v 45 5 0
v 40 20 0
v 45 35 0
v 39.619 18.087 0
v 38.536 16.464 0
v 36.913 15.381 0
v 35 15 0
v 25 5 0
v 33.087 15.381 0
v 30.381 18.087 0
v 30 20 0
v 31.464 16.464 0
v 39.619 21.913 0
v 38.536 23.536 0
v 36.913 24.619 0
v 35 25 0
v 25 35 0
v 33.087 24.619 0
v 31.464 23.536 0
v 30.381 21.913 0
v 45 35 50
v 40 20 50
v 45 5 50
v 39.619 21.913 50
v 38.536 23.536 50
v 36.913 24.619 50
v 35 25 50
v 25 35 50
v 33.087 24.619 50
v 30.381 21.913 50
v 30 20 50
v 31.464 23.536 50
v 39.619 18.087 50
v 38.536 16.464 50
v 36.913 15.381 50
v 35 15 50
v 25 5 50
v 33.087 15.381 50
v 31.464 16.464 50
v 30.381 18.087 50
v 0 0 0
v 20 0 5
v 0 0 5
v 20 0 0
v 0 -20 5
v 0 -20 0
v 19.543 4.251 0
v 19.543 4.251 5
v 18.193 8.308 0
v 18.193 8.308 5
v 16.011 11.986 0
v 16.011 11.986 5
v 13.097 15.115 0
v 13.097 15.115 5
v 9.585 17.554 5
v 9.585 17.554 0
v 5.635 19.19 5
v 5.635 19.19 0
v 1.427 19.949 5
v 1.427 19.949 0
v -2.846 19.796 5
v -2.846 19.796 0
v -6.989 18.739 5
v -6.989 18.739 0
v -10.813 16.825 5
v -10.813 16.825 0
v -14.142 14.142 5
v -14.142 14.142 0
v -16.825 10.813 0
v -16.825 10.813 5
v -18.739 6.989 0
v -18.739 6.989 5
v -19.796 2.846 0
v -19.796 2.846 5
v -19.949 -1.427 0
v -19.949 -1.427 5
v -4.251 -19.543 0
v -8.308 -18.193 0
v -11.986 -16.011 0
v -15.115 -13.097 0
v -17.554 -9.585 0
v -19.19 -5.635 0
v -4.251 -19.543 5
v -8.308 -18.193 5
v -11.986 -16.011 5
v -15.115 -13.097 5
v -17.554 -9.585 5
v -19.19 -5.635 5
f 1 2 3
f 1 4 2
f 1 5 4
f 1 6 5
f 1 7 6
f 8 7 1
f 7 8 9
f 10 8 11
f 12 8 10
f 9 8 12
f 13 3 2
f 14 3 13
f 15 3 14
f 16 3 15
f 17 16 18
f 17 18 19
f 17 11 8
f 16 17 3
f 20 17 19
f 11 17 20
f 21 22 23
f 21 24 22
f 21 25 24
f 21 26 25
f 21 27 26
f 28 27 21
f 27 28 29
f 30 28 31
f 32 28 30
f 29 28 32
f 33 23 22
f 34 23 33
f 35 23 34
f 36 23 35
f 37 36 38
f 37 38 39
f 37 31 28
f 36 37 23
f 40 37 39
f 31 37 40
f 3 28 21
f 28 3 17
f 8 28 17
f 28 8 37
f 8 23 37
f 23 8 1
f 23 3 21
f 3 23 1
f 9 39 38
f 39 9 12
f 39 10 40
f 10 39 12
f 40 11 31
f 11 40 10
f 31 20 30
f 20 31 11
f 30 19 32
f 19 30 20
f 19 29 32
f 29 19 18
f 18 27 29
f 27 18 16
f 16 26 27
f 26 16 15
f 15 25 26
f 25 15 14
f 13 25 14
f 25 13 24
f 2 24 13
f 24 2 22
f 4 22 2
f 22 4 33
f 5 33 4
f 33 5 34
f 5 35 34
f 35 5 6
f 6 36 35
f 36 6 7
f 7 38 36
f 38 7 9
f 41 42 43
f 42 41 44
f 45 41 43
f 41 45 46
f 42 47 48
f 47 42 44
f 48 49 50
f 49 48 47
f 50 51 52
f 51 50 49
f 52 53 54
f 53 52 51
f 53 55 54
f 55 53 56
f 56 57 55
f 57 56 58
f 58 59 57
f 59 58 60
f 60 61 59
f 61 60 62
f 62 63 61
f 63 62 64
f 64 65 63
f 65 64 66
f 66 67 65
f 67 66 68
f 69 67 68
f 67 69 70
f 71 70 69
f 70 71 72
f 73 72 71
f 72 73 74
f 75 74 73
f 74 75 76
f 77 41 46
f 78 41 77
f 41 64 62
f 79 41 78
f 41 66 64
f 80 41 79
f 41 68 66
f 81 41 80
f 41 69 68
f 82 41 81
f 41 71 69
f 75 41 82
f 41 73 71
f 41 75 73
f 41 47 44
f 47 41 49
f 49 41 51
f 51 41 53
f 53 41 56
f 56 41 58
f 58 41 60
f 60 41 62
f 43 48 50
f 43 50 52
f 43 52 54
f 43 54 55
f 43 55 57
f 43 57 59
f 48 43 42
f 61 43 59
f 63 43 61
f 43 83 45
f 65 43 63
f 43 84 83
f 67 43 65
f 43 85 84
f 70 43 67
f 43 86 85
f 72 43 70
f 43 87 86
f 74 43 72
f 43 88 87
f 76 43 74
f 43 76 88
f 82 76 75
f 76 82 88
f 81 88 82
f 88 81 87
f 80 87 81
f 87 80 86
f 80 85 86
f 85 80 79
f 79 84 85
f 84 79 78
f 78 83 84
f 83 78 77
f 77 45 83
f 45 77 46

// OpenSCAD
module my_2D_shape(){
    difference(){
        square([20,30], center=true);
        circle(r=5);
        }
    }
    


//regular extrude
linear_extrude(height=50)
    translate([35,20,10])
    my_2D_shape();
    
//rotate extrude
rotate_extrude(angle=270)
    square([20,5]);
